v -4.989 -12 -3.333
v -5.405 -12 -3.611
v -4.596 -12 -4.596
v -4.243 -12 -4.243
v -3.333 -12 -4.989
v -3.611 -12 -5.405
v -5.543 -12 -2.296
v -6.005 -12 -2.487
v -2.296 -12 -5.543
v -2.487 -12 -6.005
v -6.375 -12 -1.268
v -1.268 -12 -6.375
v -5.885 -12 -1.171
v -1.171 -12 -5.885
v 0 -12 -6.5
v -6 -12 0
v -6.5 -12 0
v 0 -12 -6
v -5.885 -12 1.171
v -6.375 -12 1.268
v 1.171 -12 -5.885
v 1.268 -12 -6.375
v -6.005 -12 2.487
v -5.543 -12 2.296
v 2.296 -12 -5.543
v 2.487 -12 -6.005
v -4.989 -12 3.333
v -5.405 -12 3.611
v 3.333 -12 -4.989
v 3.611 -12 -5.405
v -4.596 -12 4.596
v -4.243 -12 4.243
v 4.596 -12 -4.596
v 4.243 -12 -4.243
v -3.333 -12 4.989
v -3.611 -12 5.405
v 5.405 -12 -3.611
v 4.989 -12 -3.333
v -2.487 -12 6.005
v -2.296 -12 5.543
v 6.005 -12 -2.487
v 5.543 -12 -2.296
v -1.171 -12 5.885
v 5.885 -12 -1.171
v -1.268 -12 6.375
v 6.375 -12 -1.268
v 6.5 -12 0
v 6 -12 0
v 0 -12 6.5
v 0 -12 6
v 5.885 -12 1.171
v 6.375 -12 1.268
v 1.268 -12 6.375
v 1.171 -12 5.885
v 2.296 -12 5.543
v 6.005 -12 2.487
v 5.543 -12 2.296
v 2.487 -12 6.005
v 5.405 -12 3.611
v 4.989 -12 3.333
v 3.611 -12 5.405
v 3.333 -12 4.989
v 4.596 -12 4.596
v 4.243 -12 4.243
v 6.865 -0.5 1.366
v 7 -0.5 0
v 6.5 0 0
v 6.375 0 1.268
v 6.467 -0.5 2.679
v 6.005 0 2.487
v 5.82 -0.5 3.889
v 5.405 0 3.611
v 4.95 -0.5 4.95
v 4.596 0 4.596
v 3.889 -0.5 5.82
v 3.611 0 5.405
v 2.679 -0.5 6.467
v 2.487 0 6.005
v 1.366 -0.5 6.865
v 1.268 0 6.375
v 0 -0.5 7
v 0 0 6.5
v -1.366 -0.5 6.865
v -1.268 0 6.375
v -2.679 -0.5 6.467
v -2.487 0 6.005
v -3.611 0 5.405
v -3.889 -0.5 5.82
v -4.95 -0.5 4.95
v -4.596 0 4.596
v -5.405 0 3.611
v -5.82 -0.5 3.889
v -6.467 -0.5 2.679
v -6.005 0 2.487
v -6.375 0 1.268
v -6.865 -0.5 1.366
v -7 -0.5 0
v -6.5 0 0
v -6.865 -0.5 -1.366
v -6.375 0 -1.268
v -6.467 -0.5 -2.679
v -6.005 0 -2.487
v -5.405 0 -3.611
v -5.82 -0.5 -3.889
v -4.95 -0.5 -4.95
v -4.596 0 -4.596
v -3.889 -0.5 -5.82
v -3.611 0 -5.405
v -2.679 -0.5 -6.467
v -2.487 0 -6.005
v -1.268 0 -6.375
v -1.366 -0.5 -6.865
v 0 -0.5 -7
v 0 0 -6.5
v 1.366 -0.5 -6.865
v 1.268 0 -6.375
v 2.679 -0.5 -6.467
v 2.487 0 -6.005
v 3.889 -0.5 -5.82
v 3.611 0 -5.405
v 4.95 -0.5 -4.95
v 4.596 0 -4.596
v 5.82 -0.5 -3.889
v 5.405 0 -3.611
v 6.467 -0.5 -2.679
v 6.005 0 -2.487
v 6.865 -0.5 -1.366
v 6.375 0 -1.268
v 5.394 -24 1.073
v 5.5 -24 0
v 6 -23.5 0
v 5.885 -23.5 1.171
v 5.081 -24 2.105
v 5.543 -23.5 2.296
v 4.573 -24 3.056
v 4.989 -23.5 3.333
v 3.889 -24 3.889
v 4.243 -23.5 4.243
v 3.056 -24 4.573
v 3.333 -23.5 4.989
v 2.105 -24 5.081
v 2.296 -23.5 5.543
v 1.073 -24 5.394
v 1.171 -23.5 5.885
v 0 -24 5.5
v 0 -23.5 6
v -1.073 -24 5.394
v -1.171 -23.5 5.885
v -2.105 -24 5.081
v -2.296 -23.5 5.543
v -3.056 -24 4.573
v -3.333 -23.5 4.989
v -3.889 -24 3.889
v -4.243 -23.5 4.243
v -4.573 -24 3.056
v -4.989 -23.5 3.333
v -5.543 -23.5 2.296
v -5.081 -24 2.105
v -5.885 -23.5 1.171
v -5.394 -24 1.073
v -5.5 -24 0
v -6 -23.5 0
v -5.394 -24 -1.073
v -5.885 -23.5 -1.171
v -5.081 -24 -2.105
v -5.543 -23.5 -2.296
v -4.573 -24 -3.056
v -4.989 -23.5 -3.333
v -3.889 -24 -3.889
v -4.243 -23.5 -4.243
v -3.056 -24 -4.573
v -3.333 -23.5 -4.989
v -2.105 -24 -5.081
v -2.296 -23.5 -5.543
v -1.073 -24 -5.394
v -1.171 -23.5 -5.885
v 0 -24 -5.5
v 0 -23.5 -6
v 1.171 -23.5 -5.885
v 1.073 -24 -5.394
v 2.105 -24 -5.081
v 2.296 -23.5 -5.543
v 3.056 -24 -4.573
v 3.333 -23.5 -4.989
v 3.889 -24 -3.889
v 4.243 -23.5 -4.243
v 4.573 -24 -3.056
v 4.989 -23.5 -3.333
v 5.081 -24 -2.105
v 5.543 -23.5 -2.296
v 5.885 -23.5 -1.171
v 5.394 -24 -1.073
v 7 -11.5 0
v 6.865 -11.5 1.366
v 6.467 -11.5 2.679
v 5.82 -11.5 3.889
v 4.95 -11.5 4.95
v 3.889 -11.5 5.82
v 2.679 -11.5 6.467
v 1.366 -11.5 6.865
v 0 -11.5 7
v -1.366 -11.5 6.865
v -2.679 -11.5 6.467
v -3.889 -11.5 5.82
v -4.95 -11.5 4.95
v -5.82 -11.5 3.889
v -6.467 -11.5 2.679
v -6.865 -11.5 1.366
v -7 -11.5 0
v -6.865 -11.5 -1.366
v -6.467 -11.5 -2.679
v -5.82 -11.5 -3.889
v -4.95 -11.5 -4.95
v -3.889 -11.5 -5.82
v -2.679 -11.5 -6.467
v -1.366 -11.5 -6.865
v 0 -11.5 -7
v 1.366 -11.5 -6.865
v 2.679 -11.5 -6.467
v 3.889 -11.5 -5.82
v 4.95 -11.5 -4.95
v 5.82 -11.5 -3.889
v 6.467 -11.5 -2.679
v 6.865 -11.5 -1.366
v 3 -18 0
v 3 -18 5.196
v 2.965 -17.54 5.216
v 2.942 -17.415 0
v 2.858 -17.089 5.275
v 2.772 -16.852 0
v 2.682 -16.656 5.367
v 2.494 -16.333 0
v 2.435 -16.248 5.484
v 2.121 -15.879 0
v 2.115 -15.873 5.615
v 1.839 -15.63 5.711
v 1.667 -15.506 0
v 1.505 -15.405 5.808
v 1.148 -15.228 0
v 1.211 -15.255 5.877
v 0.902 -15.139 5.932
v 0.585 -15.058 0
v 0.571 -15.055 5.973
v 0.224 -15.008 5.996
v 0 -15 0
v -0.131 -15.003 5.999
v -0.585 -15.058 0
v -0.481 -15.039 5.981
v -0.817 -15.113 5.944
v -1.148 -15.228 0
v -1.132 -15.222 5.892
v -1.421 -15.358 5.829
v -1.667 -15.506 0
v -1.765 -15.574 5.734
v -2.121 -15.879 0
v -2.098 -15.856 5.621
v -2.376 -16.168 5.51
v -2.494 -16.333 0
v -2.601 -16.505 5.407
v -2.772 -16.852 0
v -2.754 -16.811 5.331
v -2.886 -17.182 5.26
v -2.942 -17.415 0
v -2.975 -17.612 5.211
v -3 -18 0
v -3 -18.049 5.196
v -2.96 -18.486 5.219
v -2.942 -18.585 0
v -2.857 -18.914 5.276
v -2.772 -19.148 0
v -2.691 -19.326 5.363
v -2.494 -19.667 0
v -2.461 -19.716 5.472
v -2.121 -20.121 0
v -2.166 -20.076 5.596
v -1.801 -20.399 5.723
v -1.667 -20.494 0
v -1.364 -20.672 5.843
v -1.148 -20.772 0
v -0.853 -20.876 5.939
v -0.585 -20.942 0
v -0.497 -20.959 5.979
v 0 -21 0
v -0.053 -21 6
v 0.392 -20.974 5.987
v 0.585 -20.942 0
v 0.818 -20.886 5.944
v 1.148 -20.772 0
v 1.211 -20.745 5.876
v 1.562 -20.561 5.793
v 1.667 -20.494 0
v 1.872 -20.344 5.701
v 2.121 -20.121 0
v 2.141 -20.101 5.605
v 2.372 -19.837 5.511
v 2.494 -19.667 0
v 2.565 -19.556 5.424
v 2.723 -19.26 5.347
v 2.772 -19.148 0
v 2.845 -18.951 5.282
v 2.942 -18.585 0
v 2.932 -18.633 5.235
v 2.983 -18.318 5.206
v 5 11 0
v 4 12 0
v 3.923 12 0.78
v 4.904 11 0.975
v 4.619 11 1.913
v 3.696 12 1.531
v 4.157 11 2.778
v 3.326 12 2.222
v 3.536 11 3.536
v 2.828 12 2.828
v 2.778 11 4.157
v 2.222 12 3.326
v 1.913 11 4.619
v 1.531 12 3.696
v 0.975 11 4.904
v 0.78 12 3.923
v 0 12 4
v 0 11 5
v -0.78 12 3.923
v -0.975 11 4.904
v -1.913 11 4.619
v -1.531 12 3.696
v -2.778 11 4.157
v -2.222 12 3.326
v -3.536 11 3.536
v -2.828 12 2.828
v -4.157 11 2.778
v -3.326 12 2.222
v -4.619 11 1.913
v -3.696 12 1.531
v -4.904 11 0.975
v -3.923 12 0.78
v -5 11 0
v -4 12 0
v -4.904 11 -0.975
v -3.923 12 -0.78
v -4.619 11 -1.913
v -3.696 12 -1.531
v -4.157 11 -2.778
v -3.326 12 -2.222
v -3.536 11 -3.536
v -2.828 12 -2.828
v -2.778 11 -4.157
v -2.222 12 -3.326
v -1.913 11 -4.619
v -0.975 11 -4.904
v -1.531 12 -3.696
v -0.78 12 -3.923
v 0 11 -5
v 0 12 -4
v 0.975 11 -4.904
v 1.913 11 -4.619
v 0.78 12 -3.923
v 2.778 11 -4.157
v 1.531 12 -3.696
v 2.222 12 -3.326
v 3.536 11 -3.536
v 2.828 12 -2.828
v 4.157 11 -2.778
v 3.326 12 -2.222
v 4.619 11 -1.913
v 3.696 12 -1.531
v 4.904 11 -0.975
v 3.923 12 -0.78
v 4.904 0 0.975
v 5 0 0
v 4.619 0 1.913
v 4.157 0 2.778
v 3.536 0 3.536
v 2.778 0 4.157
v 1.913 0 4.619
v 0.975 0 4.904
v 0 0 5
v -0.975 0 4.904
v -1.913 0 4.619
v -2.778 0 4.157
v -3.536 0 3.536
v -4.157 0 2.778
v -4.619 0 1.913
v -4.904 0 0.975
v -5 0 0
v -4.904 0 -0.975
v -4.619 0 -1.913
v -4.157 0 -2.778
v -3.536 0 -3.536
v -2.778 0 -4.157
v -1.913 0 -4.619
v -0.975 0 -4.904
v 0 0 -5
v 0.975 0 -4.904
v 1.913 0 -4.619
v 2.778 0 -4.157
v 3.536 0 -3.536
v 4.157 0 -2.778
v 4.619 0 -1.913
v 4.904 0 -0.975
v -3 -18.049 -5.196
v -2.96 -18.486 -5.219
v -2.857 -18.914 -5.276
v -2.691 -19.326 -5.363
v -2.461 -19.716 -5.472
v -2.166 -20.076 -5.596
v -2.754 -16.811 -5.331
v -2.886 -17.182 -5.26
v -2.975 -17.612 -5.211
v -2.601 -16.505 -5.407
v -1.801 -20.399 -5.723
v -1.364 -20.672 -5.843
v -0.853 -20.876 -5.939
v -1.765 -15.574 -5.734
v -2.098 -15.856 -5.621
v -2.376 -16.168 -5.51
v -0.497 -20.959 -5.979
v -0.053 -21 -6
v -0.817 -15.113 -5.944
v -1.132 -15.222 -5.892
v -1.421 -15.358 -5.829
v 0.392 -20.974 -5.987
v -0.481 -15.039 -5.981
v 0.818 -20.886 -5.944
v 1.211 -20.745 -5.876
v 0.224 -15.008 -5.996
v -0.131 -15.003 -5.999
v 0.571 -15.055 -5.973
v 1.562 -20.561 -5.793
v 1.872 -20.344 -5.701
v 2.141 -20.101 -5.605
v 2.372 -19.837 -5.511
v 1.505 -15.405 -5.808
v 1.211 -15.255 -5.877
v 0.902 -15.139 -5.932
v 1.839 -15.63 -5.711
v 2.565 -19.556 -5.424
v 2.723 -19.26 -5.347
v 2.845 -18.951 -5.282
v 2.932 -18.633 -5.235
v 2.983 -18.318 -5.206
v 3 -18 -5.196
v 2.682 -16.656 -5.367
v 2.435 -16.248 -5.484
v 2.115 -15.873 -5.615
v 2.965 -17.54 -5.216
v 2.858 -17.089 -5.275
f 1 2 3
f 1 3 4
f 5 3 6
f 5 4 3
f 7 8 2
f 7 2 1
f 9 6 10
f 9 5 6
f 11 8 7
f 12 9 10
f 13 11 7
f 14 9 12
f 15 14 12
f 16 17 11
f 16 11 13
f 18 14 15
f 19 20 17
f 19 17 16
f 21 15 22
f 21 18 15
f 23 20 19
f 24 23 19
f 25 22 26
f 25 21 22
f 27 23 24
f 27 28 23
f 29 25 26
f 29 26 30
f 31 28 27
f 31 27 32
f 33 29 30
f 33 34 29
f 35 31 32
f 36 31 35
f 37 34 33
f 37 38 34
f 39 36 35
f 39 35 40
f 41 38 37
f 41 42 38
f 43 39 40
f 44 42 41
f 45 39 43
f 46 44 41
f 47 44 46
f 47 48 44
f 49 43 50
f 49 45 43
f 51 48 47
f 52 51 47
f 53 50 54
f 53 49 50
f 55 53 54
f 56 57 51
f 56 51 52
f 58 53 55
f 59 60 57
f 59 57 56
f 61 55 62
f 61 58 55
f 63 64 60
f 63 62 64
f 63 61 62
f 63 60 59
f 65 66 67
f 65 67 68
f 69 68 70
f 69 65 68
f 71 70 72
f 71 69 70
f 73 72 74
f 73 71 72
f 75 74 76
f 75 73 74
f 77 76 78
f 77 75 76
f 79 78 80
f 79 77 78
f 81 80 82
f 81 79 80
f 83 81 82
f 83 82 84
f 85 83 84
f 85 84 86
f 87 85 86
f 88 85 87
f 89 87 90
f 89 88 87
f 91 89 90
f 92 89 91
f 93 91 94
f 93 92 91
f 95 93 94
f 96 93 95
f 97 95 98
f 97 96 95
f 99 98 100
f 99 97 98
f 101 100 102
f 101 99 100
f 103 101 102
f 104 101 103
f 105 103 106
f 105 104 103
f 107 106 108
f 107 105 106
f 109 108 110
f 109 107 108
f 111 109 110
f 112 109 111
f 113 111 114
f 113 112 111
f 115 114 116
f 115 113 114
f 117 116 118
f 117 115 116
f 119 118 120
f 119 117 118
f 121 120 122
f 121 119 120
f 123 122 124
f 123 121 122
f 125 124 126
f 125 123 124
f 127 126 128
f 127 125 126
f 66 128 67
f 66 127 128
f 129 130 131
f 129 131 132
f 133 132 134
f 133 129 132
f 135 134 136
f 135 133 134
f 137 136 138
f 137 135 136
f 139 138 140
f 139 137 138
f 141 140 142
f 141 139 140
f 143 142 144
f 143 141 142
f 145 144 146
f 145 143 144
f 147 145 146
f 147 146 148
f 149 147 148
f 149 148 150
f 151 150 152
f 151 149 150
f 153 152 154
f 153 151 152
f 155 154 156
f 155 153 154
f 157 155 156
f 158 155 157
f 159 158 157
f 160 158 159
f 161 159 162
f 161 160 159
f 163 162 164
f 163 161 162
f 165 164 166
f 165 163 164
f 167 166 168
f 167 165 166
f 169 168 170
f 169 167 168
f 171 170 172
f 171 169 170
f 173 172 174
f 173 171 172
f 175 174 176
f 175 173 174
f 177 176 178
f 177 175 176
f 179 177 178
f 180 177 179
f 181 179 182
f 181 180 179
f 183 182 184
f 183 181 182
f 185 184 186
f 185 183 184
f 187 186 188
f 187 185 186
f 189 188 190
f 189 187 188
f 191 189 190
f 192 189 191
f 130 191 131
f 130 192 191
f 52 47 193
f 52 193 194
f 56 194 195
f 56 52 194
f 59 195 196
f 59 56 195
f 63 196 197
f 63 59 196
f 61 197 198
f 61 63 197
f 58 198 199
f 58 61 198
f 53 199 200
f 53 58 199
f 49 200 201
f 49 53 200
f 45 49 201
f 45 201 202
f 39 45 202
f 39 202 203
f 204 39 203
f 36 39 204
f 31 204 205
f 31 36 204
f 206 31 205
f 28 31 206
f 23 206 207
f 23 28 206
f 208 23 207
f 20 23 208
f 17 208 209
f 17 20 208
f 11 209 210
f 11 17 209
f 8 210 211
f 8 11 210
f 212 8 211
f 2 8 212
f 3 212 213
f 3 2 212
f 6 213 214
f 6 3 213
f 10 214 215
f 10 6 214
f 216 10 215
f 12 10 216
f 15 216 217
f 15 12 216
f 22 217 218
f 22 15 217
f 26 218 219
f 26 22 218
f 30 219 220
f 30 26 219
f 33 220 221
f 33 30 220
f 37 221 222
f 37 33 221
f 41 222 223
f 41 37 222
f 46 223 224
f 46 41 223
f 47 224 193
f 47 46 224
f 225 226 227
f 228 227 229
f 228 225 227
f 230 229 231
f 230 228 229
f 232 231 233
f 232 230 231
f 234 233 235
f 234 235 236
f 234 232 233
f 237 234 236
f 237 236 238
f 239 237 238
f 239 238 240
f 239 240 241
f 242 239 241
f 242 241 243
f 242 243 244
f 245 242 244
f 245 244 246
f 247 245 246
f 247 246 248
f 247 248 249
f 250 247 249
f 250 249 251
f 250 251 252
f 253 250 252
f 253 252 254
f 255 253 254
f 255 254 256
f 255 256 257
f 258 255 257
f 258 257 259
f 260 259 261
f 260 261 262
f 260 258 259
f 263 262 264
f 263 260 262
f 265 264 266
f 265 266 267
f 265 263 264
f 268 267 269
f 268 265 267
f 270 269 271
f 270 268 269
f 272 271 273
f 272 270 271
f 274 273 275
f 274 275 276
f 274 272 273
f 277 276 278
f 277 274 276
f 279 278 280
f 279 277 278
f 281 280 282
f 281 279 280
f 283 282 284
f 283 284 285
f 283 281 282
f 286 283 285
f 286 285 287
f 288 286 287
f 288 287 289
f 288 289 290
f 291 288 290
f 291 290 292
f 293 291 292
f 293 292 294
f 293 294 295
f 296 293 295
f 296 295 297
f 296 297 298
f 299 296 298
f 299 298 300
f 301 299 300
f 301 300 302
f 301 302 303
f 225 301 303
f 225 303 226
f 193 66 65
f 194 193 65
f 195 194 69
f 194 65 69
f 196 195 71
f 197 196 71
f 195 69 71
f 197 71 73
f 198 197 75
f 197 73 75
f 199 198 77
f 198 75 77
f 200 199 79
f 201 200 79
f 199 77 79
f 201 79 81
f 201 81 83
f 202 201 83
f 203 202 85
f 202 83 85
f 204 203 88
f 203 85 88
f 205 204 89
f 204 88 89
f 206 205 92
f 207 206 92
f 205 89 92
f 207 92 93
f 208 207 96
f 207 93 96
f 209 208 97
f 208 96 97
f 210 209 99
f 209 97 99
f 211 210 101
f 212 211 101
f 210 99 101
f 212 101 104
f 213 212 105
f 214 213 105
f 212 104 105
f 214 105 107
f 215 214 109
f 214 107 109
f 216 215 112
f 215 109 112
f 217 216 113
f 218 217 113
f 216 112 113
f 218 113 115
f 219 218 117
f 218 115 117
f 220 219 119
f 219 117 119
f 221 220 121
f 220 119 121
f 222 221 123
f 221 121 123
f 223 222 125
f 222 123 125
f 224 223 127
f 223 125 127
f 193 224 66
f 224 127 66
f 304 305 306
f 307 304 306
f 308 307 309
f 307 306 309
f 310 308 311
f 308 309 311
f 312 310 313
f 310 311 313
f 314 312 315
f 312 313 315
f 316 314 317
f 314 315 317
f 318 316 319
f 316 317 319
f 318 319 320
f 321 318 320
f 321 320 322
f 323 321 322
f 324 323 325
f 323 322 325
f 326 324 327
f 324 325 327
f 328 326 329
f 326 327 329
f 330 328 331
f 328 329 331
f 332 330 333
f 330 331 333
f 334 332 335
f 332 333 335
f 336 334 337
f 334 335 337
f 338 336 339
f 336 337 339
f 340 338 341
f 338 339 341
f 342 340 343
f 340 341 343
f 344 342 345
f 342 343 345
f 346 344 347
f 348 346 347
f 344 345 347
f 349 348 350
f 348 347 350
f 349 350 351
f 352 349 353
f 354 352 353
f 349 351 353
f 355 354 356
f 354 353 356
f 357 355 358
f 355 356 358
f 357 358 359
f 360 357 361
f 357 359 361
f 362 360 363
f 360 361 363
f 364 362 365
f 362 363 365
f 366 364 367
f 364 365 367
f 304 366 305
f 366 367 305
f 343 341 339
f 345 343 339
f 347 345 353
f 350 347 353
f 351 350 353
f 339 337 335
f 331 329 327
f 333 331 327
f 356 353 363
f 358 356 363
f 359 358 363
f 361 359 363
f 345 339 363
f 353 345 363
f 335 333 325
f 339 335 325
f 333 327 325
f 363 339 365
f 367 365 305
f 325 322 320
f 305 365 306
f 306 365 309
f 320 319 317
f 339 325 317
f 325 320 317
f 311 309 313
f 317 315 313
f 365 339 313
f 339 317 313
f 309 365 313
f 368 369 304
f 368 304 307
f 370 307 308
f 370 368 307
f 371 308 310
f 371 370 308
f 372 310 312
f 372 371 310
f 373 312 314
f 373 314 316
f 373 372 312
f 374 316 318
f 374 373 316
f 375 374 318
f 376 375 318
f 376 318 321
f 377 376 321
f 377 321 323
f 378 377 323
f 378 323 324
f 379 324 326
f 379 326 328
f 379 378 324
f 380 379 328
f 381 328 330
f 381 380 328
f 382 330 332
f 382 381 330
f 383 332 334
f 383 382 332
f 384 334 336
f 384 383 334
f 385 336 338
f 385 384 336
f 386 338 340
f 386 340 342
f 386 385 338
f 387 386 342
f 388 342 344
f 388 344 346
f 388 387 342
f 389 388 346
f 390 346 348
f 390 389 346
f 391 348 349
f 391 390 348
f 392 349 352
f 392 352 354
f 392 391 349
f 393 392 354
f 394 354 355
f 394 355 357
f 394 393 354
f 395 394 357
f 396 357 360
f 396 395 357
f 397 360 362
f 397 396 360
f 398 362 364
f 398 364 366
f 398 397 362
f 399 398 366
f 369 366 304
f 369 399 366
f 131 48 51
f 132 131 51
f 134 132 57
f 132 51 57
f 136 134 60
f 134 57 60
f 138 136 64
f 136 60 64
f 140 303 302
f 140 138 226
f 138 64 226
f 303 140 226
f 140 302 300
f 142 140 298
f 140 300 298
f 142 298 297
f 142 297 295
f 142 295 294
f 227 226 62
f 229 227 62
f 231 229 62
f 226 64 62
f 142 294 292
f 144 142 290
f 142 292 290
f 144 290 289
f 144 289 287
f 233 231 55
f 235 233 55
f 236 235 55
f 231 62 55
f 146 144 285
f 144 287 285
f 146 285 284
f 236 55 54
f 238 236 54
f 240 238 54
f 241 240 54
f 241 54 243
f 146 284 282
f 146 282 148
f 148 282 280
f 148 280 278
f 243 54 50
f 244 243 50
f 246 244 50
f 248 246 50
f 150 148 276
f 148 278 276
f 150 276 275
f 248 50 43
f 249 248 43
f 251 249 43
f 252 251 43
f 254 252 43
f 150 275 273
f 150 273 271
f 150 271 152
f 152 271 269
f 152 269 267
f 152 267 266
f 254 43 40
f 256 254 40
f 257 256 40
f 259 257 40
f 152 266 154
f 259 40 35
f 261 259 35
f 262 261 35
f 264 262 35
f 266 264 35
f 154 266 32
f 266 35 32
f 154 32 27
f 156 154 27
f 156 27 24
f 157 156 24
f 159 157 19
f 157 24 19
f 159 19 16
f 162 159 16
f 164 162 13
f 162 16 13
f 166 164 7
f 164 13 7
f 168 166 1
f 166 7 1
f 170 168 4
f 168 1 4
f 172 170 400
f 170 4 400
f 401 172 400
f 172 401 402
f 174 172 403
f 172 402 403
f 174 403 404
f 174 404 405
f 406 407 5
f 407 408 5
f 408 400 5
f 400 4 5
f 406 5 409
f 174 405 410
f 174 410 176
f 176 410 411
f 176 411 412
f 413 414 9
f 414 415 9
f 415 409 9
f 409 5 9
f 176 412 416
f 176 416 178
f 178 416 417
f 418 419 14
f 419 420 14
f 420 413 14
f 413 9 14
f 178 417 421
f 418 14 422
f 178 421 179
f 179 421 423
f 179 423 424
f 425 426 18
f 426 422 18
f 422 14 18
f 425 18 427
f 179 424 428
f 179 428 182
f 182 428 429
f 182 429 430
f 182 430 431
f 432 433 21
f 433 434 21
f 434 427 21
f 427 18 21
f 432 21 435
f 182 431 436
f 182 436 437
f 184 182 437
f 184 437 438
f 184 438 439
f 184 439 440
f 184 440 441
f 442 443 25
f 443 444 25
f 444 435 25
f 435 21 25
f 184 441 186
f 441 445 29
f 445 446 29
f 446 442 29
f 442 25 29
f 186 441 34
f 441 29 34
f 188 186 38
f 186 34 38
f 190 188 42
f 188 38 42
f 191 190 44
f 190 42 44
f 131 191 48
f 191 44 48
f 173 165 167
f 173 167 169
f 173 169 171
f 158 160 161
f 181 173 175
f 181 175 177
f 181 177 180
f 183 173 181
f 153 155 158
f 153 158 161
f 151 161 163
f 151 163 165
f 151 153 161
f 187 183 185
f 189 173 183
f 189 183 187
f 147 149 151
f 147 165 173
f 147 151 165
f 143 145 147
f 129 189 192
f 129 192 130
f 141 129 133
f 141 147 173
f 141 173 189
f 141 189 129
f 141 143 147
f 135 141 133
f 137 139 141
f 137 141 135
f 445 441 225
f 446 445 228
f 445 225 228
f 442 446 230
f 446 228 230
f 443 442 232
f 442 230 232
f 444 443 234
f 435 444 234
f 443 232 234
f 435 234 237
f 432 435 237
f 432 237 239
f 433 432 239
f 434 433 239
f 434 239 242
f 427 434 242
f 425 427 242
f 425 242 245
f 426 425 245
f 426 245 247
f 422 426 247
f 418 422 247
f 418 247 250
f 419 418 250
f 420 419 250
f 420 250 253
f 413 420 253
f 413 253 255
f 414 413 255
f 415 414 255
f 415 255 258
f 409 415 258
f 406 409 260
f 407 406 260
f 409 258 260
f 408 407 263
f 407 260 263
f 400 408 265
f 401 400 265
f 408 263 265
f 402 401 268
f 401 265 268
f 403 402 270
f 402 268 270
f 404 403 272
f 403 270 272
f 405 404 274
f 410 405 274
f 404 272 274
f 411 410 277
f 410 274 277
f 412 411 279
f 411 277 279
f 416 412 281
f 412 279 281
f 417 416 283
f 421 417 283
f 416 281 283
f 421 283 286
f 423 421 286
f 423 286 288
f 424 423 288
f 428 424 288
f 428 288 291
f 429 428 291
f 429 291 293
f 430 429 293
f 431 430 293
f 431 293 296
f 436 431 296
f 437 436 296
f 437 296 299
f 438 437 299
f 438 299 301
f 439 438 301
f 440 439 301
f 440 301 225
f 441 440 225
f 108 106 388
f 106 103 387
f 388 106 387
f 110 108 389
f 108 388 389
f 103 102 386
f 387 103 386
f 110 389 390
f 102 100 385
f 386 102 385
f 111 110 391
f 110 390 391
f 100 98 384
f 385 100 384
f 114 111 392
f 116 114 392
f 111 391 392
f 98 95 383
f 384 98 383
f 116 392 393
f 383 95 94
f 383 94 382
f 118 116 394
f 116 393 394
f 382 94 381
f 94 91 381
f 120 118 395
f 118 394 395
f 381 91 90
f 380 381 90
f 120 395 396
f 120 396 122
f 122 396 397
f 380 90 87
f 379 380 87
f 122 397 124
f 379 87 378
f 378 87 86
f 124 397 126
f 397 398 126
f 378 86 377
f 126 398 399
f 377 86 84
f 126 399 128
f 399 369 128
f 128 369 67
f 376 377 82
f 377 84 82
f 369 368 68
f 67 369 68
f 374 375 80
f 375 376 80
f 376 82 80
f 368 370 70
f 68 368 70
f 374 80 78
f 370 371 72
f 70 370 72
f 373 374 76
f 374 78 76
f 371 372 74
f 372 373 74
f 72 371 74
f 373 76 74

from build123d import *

# Parameters (mm, degrees)
F0_R          = 7
F0_R_2        = 6
F1_DEPTH      = 12
F0_R_3        = 5
F2_DEPTH      = 24
F3_DEPTH      = 24
F3_DEPTH_BACK = 12
F4_SIZE       = 1
F5_SIZE       = 0.5
F6_R          = 3
F7_DEPTH      = 25
F7_DEPTH_BACK = 25


with BuildPart() as f1:
    # F0 (on Front) → F1 (new body)
    with BuildSketch(Plane.XZ):
        Circle(F0_R)
        Circle(F0_R_2, mode=Mode.SUBTRACT)
    extrude(amount=F1_DEPTH)

    # F0 (on Front) → F2 (join)
    with BuildSketch(Plane.XZ):
        Circle(F0_R_2)
        Circle(F0_R_3, mode=Mode.SUBTRACT)
    extrude(amount=F2_DEPTH)

    # F0 (on Front) → F3 (join, two sides)
    with BuildSketch(Plane.XZ) as f3_sk:
        Circle(F0_R_3)
    extrude(amount=F3_DEPTH)
    extrude(f3_sk.sketch, amount=-F3_DEPTH_BACK)

    # F4
    f4_edges = [f1.edges().sort_by_distance(p)[0] for p in [
        (-5, 12, 0),
    ]]
    chamfer(f4_edges, length=F4_SIZE)

    # F5
    f5_edges = [f1.edges().sort_by_distance(p)[0] for p in [
        (-6, -24, 0),
        (-7, -12, 0),
        (7, -6, 0),
        (-7, 0, 0),
    ]]
    chamfer(f5_edges, length=F5_SIZE)

    # F6 (on Top) → F7 (cut, two sides)
    with BuildSketch(Plane.XY) as f7_sk:
        with Locations((0, -18)):
            Circle(F6_R)
    extrude(amount=-F7_DEPTH, mode=Mode.SUBTRACT)
    extrude(f7_sk.sketch, amount=F7_DEPTH_BACK, mode=Mode.SUBTRACT)


solid = f1.part
